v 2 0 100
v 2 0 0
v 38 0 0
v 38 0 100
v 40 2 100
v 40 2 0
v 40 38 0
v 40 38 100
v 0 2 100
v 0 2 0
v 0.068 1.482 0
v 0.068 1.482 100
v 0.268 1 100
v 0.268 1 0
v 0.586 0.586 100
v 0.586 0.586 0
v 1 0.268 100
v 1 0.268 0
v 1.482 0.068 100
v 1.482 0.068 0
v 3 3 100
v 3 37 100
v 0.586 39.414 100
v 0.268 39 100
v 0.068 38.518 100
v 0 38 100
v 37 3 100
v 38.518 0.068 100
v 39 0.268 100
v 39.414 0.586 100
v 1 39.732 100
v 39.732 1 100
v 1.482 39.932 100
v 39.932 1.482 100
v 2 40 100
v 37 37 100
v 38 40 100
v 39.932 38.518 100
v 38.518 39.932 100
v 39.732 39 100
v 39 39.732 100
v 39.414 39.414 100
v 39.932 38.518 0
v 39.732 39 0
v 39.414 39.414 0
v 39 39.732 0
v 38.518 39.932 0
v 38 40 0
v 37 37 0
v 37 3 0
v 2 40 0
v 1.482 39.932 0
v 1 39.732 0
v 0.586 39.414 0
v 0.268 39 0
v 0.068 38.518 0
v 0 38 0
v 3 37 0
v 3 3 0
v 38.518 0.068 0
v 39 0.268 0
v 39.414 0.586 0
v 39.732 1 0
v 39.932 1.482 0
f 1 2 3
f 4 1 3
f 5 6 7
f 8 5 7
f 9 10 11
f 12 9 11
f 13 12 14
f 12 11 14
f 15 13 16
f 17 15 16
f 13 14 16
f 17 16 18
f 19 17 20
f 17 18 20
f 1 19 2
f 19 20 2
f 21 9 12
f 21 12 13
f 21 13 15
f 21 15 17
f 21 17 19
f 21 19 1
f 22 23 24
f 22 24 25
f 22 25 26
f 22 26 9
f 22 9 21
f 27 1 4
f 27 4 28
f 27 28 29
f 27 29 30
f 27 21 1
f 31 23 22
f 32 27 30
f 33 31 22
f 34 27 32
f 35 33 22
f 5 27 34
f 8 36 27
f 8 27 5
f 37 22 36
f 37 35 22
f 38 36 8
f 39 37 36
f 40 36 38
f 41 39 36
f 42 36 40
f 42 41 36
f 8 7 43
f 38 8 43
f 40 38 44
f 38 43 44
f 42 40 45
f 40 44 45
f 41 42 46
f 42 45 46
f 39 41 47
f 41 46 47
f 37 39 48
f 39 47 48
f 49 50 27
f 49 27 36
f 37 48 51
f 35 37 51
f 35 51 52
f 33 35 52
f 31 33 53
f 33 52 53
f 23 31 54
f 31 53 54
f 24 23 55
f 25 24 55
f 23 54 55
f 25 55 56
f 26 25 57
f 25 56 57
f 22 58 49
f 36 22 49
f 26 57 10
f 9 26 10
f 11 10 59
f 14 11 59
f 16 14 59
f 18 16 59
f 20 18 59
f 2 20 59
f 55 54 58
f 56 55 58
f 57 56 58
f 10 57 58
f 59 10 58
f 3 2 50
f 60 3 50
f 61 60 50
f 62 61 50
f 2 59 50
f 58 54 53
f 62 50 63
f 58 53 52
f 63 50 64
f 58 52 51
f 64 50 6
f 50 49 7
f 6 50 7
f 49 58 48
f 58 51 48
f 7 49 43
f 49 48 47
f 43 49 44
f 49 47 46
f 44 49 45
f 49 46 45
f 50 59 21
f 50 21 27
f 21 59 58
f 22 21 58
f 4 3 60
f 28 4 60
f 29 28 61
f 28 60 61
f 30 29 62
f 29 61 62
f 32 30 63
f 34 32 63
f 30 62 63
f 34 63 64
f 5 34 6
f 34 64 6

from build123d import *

# Parameters (mm, degrees)
SKETCH_W  = 34
SKETCH_H  = 34
PAD_DEPTH = 100


with BuildPart() as part:
    # Sketch → Pad (new body)
    with BuildSketch(Plane.XY):
        with BuildLine():
            Line((2, 0), (38, 0))
            ThreePointArc((38, 0), (39.414214, 0.585786), (40, 2))
            Line((40, 2), (40, 38))
            ThreePointArc((40, 38), (39.414214, 39.414214), (38, 40))
            Line((38, 40), (2, 40))
            ThreePointArc((2, 40), (0.585786, 39.414214), (0, 38))
            Line((0, 38), (0, 2))
            ThreePointArc((0, 2), (0.585786, 0.585786), (2, 0))
        make_face()
        with Locations((20, 20)):
            Rectangle(SKETCH_W, SKETCH_H, mode=Mode.SUBTRACT)
    extrude(amount=PAD_DEPTH)


solid = part.part
